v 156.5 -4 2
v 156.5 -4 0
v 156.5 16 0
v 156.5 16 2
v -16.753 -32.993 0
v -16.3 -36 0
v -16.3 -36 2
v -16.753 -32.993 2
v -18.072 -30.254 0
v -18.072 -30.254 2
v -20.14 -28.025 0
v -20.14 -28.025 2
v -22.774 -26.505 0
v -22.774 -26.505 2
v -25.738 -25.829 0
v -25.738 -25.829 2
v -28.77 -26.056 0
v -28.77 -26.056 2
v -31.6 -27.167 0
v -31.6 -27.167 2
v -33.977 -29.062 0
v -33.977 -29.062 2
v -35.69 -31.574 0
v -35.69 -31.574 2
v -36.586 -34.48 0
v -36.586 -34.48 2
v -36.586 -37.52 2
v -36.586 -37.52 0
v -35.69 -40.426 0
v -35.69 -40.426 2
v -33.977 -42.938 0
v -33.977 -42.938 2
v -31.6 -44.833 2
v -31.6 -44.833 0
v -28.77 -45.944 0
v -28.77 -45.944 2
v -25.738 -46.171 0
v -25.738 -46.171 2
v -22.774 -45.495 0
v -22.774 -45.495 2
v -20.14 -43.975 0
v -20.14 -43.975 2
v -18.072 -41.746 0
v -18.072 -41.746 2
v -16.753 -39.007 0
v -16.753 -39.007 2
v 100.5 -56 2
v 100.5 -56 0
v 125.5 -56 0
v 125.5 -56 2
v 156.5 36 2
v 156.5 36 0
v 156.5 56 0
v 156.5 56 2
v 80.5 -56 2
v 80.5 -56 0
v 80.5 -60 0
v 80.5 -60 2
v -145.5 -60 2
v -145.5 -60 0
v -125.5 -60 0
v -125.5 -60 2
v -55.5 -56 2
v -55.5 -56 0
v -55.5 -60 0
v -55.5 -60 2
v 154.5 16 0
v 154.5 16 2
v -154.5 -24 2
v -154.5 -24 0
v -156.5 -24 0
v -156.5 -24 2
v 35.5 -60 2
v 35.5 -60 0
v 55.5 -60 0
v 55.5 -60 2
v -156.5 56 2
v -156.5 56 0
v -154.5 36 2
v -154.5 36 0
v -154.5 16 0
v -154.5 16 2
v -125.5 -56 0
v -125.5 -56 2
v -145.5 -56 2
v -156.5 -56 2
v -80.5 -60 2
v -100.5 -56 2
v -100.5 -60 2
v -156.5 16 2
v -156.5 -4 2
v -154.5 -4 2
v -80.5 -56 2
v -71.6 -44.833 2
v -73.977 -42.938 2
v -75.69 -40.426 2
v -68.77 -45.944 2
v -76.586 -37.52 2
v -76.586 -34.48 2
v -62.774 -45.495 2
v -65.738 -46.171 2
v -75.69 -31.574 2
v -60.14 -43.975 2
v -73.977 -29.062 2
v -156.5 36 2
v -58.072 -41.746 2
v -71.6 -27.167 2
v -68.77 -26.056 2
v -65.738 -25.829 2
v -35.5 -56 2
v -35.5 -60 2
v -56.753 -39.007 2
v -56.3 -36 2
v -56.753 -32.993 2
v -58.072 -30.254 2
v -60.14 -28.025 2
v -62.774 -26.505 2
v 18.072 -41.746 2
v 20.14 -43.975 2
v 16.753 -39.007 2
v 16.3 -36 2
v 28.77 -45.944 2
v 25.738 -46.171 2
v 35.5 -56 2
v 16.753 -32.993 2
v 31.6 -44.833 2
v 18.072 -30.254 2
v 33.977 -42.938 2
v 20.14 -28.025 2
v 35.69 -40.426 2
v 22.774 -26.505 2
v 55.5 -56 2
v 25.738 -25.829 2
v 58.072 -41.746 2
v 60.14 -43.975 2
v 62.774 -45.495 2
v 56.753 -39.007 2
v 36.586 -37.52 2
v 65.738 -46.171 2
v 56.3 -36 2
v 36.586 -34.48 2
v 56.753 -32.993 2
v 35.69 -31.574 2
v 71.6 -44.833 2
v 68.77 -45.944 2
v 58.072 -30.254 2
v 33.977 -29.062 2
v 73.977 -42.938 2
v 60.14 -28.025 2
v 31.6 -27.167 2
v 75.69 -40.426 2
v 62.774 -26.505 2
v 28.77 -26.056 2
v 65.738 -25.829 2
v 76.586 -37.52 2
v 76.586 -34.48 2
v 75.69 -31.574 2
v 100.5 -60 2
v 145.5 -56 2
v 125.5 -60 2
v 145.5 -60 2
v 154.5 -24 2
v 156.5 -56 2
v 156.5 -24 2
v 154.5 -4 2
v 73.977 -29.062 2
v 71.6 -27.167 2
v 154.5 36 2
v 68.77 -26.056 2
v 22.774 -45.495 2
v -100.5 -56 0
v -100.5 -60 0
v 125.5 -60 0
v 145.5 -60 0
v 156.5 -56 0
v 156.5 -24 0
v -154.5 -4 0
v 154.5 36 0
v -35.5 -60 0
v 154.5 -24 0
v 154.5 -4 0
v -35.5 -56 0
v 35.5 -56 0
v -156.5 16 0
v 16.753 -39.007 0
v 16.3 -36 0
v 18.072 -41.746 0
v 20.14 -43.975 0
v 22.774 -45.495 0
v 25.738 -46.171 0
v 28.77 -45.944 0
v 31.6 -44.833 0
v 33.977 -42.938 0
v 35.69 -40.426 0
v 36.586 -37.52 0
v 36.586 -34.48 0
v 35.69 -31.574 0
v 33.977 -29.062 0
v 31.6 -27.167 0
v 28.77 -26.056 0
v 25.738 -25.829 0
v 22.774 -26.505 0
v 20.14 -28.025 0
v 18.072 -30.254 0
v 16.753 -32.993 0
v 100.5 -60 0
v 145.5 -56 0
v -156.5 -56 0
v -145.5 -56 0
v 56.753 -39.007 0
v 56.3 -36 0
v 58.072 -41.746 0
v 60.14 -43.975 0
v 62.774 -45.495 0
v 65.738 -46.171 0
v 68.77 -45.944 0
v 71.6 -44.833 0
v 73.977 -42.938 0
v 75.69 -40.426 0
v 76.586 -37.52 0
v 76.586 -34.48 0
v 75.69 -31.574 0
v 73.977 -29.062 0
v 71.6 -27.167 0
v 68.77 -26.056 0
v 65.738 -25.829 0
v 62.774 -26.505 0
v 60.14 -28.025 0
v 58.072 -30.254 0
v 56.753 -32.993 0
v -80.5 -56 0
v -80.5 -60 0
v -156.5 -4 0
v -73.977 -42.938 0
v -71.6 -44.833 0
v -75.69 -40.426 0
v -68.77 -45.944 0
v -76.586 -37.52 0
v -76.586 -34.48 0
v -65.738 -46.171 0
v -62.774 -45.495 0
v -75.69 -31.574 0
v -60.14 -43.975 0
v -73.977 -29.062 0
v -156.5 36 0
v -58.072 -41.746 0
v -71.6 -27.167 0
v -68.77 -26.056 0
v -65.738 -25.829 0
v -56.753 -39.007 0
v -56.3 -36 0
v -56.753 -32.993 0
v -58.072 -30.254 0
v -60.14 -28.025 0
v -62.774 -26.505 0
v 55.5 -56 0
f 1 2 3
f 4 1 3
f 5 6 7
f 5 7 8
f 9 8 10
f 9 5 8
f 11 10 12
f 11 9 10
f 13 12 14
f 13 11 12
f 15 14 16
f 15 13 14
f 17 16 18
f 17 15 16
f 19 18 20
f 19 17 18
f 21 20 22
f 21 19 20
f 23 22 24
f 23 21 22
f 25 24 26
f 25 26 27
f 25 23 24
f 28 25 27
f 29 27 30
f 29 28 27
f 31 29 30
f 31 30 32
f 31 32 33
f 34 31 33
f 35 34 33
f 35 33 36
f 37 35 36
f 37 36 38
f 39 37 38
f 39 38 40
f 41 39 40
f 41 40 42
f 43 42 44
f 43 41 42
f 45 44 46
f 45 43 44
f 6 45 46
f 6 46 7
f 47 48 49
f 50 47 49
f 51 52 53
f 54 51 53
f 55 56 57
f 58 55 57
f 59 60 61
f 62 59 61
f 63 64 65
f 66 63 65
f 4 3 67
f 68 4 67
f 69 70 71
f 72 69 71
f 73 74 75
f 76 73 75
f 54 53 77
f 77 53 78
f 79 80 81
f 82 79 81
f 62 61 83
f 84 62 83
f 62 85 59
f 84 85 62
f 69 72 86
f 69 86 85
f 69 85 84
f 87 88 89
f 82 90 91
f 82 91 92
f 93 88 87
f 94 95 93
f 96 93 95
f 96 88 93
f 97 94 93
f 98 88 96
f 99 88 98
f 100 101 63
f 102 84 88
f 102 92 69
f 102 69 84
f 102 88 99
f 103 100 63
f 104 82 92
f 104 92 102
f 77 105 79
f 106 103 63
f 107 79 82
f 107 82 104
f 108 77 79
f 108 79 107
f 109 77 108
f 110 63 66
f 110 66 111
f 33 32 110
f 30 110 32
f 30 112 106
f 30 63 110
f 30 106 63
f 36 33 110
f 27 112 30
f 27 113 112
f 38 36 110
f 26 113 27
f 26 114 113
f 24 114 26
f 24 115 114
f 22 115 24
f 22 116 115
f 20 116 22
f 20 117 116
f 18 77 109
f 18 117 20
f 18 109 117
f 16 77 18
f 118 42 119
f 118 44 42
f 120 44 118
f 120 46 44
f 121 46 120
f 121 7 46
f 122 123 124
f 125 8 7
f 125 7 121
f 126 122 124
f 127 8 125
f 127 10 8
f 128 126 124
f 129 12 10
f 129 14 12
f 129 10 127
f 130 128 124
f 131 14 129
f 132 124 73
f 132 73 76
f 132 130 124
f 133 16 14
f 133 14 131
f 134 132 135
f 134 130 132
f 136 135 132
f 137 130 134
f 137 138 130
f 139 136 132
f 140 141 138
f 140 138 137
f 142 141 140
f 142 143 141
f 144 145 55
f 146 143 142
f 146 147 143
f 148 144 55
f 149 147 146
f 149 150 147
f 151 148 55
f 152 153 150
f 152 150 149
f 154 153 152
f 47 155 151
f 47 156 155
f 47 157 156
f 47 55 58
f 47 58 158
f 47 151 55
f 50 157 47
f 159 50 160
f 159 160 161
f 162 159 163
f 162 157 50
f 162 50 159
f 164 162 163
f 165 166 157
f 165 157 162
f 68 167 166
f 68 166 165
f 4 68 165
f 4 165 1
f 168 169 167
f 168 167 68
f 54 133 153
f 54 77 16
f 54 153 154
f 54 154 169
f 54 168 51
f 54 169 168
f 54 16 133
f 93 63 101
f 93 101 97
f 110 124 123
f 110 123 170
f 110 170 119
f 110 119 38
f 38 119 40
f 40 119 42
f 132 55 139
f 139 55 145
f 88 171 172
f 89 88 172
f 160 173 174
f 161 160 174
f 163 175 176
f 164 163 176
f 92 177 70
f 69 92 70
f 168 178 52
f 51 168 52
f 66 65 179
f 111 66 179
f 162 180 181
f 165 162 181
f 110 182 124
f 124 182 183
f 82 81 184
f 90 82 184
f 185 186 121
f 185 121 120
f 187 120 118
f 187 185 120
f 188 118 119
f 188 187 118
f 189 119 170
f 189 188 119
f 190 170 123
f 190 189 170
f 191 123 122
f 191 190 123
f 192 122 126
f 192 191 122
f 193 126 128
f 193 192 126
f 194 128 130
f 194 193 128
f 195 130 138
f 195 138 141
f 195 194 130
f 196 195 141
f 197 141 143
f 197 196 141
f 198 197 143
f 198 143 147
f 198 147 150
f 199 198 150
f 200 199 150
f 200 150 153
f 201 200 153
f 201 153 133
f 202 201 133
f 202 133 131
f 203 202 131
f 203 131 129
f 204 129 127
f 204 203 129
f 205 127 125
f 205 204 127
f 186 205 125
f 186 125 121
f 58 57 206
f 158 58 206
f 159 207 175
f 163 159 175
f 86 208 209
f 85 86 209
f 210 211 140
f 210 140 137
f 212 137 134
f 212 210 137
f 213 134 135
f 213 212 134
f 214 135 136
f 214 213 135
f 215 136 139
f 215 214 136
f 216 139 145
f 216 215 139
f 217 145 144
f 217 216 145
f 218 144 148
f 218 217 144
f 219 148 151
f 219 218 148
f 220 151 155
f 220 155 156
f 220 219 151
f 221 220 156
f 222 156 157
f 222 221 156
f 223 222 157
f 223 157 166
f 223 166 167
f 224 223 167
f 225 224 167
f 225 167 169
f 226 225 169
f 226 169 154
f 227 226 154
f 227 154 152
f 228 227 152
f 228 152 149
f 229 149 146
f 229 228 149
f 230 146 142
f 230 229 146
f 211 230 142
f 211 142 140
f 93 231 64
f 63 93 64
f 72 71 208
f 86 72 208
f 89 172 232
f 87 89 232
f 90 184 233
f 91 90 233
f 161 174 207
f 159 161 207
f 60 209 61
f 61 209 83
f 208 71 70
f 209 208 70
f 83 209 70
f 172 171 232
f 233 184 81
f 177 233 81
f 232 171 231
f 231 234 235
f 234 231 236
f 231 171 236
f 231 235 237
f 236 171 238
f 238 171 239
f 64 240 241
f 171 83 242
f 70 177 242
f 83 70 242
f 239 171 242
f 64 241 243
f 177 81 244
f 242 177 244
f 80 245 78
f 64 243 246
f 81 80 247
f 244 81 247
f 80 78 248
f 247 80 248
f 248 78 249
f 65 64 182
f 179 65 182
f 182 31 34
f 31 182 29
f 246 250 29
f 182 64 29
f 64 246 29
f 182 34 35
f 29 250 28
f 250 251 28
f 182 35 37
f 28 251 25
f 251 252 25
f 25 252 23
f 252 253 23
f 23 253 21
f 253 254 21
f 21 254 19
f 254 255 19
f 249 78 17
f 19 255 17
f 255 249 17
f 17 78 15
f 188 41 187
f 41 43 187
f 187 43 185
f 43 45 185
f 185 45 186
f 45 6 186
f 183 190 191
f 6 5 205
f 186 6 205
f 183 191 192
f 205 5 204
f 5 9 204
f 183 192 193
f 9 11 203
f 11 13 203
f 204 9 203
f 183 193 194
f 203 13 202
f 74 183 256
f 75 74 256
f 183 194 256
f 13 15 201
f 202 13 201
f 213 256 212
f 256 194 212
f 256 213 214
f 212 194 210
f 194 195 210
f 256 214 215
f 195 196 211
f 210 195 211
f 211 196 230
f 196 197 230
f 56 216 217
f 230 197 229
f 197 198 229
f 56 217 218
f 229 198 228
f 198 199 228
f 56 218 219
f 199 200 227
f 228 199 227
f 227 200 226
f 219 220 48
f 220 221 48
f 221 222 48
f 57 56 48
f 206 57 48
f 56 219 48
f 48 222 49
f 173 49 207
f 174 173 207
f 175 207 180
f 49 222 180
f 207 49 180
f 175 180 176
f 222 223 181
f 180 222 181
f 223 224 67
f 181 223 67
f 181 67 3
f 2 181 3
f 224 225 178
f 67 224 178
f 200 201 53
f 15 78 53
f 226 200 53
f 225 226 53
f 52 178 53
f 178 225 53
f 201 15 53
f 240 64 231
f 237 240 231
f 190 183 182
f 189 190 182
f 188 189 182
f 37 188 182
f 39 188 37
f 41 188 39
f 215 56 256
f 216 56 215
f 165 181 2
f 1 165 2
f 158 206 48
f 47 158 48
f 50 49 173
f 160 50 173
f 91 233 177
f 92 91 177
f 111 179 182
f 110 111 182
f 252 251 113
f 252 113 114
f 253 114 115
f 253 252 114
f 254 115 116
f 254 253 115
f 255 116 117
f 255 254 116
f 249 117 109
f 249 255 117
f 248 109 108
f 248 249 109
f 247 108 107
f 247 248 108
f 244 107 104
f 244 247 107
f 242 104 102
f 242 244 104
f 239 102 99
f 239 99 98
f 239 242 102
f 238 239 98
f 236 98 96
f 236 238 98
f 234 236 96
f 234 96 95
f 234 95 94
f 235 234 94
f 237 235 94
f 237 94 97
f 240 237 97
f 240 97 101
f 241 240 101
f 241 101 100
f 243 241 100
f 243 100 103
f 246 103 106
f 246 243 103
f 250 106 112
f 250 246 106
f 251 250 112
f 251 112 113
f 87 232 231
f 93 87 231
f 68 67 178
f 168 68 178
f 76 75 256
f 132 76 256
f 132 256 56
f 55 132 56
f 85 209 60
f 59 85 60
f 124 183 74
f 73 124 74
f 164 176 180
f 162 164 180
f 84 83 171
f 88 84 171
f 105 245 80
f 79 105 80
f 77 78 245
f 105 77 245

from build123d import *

# Parameters (mm, degrees)
SKETCH1_R               = 10.2
BOSS_EXTRUDE1_DEPTH     = 2
CUT_EXTRUDE4_DEPTH      = 168.619360457
CUT_EXTRUDE4_DEPTH_BACK = 168.619360457
SKETCH5_W               = 20
SKETCH5_H               = 2


with BuildPart() as part:
    # Sketch1 → Boss-Extrude1 (new body)
    with BuildSketch(Plane.XY):
        Polygon((-156.5, -56), (-145.5, -56), (-145.5, -60), (-125.5, -60), (-125.5, -56), (-100.5, -56), (-100.5, -60), (-80.5, -60), (-80.5, -56), (-55.5, -56), (-55.5, -60), (-35.5, -60), (-35.5, -56), (35.5, -56), (35.5, -60), (55.5, -60), (55.5, -56), (80.5, -56), (80.5, -60), (100.5, -60), (100.5, -56), (125.5, -56), (125.5, -60), (145.5, -60), (145.5, -56), (156.5, -56), (156.5, -24), (154.5, -24), (154.5, -4), (156.5, -4), (156.5, 16), (154.5, 16), (154.5, 36), (156.5, 36), (156.5, 56), (145.5, 56), (145.5, 58), (125.5, 58), (125.5, 56), (100.5, 56), (100.5, 58), (80.5, 58), (80.5, 56), (55.5, 56), (55.5, 58), (35.5, 58), (35.5, 56), (-35.5, 56), (-35.5, 58), (-55.5, 58), (-55.5, 56), (-80.5, 56), (-80.5, 58), (-100.5, 58), (-100.5, 56), (-125.5, 56), (-125.5, 58), (-145.5, 58), (-145.5, 56), (-156.5, 56), (-156.5, 36), (-154.5, 36), (-154.5, 16), (-156.5, 16), (-156.5, -4), (-154.5, -4), (-154.5, -24), (-156.5, -24), align=None)
        with Locations((-66.5, -36)):
            Circle(SKETCH1_R, mode=Mode.SUBTRACT)
        with Locations((-26.5, -36)):
            Circle(SKETCH1_R, mode=Mode.SUBTRACT)
        with Locations(Location((26.5, -36, 0), (0, 0, 180))):
            Circle(SKETCH1_R, mode=Mode.SUBTRACT)
        with Locations(Location((66.5, -36, 0), (0, 0, 180))):
            Circle(SKETCH1_R, mode=Mode.SUBTRACT)
    extrude(amount=BOSS_EXTRUDE1_DEPTH)

    # Sketch5 → Cut-Extrude4 (cut, two sides: drawn at the far end of the back side and taken through both)
    with BuildSketch(Plane.XY.offset(2).offset(-CUT_EXTRUDE4_DEPTH_BACK)):
        with Locations((-135.5, 57)):
            Rectangle(SKETCH5_W, SKETCH5_H)
        with Locations((-90.5, 57)):
            Rectangle(SKETCH5_W, SKETCH5_H)
        with Locations((-45.5, 57)):
            Rectangle(SKETCH5_W, SKETCH5_H)
        with Locations((45.5, 57)):
            Rectangle(SKETCH5_W, SKETCH5_H)
        with Locations((90.5, 57)):
            Rectangle(SKETCH5_W, SKETCH5_H)
        with Locations((135.5, 57)):
            Rectangle(SKETCH5_W, SKETCH5_H)
    extrude(amount=CUT_EXTRUDE4_DEPTH + CUT_EXTRUDE4_DEPTH_BACK, mode=Mode.SUBTRACT)


solid = part.part
